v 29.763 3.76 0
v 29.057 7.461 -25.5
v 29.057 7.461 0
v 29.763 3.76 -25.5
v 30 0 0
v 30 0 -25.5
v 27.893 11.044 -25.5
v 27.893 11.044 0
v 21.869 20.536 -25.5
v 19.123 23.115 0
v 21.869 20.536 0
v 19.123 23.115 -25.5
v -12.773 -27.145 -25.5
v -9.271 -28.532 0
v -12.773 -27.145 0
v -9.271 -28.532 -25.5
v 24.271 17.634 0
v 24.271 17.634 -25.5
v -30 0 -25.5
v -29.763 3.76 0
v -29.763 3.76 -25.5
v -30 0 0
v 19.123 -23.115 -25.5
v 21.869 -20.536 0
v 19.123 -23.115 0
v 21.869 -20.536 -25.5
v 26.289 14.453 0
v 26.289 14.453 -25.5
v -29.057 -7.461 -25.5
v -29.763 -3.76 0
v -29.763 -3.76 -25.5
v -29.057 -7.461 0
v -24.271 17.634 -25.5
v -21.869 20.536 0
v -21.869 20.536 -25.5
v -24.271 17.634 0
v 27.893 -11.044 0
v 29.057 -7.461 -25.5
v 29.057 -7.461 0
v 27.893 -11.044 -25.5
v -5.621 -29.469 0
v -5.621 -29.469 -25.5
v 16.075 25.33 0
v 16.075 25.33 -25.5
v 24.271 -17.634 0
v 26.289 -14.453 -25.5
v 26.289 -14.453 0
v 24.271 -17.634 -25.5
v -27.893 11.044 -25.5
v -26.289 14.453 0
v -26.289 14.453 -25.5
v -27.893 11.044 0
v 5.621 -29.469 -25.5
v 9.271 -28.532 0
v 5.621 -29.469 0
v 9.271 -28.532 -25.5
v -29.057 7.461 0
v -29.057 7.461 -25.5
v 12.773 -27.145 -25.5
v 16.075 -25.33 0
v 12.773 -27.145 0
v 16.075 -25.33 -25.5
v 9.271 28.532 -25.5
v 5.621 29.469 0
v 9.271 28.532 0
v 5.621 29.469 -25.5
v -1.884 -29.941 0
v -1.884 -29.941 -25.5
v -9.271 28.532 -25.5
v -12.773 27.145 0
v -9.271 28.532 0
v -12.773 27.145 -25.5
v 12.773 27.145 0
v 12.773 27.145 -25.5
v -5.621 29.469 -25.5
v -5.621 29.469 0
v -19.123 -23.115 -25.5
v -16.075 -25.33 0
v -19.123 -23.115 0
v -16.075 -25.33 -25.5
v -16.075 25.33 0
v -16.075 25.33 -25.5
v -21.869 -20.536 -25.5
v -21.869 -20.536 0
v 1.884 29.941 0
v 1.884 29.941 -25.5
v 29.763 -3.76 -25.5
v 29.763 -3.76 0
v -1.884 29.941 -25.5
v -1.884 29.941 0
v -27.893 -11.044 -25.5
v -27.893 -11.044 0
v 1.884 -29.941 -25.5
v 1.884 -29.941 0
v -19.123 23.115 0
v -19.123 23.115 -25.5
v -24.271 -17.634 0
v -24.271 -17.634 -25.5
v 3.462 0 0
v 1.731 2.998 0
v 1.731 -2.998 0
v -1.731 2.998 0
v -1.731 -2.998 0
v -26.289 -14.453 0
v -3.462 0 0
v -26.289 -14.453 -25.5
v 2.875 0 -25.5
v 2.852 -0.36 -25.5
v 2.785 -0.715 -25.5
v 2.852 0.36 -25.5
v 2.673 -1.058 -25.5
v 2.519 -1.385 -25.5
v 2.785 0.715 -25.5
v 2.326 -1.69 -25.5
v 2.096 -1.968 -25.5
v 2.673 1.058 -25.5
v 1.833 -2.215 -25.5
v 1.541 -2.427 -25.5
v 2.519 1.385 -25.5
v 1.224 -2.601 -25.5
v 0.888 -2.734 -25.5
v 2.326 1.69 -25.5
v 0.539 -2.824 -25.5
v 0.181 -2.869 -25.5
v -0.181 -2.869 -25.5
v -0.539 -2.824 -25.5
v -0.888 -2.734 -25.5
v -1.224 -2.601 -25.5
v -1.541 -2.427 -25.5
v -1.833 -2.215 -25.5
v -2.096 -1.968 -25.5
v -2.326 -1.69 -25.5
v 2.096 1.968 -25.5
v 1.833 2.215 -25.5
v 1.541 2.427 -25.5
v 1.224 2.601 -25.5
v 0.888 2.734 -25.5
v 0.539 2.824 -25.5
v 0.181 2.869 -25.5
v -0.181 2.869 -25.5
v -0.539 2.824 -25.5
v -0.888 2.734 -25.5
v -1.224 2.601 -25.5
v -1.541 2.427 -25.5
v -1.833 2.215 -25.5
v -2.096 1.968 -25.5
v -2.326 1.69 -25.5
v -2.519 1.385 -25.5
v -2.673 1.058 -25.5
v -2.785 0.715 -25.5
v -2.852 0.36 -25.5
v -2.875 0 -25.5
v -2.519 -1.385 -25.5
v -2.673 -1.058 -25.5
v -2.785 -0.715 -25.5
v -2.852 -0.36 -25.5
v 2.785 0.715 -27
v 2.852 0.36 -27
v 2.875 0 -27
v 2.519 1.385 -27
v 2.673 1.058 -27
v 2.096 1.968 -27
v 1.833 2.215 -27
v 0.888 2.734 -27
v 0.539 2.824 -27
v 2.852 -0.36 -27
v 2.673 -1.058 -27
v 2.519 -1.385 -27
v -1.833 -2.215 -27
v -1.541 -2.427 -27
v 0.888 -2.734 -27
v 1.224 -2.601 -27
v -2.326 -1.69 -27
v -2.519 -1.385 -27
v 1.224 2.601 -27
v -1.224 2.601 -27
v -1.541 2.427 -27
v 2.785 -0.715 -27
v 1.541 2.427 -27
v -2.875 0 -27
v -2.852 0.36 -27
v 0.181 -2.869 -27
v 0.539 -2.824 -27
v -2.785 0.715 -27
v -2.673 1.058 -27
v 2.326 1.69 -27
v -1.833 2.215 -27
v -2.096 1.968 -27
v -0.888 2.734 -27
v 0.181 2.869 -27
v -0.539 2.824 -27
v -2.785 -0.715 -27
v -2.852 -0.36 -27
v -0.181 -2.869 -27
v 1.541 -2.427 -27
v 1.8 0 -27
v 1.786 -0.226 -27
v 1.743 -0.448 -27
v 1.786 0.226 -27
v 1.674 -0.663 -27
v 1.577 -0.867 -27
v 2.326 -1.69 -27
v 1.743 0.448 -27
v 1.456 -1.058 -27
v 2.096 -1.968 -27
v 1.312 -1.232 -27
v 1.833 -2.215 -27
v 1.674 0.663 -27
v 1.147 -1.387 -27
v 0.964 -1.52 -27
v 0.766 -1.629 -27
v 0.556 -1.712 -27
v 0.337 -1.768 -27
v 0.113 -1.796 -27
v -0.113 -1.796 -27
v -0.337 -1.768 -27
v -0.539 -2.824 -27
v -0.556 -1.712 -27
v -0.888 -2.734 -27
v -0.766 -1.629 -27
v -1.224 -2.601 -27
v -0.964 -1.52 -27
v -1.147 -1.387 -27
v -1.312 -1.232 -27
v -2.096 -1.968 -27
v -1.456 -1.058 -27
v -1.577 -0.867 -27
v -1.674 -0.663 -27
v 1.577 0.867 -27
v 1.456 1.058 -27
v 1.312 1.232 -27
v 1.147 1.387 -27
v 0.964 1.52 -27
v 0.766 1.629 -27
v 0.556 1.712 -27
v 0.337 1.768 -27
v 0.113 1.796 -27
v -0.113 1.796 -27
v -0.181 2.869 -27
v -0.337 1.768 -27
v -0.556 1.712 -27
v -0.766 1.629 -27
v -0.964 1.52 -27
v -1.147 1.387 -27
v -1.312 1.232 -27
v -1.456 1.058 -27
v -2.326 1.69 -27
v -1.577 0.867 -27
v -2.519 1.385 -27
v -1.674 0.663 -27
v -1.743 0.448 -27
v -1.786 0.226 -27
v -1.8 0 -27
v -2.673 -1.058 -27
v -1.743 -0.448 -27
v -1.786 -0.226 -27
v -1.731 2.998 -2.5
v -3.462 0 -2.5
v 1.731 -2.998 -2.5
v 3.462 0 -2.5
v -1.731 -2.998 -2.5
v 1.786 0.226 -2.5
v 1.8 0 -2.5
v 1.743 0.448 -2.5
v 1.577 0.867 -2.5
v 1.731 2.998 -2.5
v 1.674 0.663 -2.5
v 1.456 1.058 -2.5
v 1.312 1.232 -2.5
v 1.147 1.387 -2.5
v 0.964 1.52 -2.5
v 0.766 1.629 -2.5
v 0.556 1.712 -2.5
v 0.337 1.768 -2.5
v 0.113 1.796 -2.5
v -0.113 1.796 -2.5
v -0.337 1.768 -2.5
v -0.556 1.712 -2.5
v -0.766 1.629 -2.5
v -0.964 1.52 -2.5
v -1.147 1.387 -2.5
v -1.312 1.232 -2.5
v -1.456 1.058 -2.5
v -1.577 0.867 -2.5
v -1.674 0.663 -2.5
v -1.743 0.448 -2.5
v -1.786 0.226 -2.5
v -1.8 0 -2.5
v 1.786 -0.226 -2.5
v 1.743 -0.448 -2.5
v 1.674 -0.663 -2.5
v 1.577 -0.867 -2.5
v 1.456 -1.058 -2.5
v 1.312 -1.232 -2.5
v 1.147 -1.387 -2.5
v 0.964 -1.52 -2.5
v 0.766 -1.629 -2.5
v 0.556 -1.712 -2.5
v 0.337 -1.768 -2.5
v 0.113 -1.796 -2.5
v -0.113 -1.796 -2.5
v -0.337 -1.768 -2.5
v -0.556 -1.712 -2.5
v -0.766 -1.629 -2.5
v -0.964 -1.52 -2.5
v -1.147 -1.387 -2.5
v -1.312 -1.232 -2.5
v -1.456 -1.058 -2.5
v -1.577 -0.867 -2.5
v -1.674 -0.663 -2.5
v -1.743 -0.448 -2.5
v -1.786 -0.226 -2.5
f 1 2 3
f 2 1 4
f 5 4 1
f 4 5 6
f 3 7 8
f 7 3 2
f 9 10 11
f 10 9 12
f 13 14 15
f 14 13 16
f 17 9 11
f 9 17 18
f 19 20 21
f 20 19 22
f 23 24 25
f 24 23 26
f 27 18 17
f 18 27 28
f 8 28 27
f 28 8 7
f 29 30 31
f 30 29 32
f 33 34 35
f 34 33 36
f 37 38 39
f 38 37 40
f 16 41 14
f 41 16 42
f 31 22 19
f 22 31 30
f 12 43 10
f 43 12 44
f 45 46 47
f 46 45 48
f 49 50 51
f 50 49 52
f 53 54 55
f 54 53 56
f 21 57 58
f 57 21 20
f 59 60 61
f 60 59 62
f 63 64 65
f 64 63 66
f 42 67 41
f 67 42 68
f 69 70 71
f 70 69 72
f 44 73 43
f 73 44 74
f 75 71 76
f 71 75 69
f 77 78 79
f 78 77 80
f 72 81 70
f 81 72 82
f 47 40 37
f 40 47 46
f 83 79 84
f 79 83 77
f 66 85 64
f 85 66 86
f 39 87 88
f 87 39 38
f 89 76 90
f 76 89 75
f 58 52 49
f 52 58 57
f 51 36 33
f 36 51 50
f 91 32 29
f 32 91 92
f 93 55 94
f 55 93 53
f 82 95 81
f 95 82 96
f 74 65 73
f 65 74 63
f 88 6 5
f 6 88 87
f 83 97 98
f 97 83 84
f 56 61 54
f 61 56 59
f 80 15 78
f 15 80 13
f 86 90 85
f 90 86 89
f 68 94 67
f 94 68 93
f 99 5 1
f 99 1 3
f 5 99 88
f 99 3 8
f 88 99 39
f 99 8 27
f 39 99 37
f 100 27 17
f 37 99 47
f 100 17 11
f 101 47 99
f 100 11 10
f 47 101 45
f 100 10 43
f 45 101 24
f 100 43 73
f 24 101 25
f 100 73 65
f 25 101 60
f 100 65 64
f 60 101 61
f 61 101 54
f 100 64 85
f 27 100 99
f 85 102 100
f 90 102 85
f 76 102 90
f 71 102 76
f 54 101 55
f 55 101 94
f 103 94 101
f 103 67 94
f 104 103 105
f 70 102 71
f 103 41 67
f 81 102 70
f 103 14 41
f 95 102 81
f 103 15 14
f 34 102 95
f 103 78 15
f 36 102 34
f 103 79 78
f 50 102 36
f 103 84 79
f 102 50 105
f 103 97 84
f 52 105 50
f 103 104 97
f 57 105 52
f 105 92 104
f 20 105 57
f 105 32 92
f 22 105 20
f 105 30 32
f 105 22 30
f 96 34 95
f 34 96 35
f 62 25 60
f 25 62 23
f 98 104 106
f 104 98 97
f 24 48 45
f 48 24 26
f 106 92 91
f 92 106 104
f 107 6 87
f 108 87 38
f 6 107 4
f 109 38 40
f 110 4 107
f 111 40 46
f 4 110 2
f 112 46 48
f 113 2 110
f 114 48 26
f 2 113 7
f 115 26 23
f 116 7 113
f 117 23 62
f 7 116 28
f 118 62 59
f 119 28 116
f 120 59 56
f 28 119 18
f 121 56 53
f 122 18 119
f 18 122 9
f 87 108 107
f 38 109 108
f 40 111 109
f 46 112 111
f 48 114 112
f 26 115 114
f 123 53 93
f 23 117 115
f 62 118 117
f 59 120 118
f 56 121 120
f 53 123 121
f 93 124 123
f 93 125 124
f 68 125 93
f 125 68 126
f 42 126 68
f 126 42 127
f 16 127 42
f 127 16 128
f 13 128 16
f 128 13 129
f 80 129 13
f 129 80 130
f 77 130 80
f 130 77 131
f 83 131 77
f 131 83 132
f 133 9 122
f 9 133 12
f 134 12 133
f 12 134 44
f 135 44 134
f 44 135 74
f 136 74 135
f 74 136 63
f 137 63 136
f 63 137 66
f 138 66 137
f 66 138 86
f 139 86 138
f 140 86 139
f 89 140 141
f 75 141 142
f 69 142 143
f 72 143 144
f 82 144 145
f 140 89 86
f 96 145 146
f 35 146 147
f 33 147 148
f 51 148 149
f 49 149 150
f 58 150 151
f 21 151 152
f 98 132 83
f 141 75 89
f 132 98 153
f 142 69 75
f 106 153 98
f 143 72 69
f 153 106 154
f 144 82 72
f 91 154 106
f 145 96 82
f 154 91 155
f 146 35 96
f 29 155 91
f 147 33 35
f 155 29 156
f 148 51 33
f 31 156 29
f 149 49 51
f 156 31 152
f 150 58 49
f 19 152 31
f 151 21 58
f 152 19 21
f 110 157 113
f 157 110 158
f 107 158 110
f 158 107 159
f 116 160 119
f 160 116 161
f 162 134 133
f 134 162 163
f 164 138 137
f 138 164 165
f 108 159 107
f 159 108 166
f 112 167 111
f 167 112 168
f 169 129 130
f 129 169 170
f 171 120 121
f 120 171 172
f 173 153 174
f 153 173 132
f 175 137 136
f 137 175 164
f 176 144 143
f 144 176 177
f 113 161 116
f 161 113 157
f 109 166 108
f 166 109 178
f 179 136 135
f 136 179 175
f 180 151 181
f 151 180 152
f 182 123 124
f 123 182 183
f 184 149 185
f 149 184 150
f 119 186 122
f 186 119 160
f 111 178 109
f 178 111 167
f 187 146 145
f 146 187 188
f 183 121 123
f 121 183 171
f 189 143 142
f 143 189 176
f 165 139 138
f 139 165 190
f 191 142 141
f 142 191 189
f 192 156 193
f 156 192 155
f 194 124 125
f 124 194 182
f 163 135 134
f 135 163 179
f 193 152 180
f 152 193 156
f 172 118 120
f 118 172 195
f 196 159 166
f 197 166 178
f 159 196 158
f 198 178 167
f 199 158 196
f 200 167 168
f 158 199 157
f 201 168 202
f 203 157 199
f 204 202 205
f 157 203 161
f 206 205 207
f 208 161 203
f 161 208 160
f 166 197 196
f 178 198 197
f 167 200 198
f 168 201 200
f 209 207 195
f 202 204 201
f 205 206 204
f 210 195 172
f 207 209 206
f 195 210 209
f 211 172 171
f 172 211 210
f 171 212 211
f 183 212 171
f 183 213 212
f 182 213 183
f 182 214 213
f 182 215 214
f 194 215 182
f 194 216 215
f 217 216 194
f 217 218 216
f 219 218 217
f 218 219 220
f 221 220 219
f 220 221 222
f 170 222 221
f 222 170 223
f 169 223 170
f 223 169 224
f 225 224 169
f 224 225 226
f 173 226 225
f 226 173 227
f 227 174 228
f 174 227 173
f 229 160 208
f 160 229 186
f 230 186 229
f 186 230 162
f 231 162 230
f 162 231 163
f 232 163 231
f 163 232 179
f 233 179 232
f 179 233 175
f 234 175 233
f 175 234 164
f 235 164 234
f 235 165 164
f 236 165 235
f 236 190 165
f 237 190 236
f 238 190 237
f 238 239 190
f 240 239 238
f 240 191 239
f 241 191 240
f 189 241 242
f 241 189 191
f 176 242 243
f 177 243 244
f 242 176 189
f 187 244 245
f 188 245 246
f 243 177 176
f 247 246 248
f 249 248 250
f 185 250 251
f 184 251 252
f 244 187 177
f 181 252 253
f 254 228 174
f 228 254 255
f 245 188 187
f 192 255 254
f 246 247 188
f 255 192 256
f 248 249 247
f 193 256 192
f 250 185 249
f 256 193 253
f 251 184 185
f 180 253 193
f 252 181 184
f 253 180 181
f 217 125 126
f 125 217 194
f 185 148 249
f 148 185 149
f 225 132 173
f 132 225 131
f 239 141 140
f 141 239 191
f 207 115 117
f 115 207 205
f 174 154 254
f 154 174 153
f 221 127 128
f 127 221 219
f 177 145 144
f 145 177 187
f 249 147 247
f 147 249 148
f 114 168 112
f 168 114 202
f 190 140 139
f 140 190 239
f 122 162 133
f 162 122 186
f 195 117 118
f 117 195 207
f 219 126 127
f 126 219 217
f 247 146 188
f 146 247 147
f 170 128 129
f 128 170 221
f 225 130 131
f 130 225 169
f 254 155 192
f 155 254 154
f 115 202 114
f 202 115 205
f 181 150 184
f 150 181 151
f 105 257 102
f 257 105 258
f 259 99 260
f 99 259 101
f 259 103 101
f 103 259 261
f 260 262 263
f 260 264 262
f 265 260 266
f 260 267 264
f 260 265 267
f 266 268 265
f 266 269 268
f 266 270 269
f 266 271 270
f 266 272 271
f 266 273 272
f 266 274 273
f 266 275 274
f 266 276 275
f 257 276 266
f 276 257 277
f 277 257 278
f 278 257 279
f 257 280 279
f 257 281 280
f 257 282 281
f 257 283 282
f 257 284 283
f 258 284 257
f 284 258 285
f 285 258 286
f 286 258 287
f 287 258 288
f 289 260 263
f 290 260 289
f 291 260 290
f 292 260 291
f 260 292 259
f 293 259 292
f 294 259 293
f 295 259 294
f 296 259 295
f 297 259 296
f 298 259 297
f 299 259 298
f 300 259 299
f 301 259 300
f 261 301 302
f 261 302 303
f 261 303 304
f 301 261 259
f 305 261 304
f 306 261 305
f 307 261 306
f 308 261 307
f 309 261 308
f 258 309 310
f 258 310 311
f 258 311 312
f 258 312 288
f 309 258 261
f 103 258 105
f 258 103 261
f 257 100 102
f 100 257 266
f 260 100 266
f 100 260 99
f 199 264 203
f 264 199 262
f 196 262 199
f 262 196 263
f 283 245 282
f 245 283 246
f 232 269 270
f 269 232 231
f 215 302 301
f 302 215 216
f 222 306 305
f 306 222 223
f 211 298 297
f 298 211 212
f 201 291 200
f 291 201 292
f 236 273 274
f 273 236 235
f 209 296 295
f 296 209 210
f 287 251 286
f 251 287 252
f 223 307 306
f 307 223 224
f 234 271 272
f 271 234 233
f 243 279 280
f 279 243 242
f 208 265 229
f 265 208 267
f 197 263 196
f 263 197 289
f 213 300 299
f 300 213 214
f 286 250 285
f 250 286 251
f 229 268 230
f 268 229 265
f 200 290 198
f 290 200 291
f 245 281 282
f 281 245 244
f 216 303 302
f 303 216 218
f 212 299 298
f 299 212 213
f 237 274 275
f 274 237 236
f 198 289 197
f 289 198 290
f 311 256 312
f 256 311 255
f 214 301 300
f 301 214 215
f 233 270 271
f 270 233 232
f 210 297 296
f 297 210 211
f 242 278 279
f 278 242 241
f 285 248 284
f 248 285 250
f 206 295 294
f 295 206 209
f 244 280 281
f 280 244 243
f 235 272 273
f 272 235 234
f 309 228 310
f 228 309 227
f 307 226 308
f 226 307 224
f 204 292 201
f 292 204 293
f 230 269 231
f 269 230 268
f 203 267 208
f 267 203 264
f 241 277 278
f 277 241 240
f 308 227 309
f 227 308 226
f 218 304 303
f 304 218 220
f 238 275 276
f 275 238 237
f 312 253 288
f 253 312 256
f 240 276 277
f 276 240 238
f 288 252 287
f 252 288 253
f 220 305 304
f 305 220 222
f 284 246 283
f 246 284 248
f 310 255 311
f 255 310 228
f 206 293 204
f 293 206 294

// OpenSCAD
$fn = 50;

difference() {
	union() {
		translate(v = [0, 0, -25.5]) {
			cylinder(h = 25.5, r = 30.0);
		}
		#translate(v = [0, 0, -27.0]) {
			cylinder(h = 27, r = 2.875);
		}
	}
	union() {
		translate(v = [0, 0, 0]) {
			rotate(a = [0, 0, 0]) {
				difference() {
					union() {
						translate(v = [0, 0, -2.5]) {
							linear_extrude(height = 2.5) {
								polygon(points = [[3.4619999999999997, 0.0], [1.7310000000000003, 2.9981799479017264], [-1.7309999999999992, 2.9981799479017264], [-3.4619999999999997, 4.2397272186481365e-16], [-1.7310000000000014, -2.998179947901726], [1.7309999999999977, -2.9981799479017277]]);
							}
						}
					}
					union();
				}
			}
		}
		#translate(v = [0, 0, -100.0]) {
			cylinder(h = 200, r = 1.8);
		}
	}
}
